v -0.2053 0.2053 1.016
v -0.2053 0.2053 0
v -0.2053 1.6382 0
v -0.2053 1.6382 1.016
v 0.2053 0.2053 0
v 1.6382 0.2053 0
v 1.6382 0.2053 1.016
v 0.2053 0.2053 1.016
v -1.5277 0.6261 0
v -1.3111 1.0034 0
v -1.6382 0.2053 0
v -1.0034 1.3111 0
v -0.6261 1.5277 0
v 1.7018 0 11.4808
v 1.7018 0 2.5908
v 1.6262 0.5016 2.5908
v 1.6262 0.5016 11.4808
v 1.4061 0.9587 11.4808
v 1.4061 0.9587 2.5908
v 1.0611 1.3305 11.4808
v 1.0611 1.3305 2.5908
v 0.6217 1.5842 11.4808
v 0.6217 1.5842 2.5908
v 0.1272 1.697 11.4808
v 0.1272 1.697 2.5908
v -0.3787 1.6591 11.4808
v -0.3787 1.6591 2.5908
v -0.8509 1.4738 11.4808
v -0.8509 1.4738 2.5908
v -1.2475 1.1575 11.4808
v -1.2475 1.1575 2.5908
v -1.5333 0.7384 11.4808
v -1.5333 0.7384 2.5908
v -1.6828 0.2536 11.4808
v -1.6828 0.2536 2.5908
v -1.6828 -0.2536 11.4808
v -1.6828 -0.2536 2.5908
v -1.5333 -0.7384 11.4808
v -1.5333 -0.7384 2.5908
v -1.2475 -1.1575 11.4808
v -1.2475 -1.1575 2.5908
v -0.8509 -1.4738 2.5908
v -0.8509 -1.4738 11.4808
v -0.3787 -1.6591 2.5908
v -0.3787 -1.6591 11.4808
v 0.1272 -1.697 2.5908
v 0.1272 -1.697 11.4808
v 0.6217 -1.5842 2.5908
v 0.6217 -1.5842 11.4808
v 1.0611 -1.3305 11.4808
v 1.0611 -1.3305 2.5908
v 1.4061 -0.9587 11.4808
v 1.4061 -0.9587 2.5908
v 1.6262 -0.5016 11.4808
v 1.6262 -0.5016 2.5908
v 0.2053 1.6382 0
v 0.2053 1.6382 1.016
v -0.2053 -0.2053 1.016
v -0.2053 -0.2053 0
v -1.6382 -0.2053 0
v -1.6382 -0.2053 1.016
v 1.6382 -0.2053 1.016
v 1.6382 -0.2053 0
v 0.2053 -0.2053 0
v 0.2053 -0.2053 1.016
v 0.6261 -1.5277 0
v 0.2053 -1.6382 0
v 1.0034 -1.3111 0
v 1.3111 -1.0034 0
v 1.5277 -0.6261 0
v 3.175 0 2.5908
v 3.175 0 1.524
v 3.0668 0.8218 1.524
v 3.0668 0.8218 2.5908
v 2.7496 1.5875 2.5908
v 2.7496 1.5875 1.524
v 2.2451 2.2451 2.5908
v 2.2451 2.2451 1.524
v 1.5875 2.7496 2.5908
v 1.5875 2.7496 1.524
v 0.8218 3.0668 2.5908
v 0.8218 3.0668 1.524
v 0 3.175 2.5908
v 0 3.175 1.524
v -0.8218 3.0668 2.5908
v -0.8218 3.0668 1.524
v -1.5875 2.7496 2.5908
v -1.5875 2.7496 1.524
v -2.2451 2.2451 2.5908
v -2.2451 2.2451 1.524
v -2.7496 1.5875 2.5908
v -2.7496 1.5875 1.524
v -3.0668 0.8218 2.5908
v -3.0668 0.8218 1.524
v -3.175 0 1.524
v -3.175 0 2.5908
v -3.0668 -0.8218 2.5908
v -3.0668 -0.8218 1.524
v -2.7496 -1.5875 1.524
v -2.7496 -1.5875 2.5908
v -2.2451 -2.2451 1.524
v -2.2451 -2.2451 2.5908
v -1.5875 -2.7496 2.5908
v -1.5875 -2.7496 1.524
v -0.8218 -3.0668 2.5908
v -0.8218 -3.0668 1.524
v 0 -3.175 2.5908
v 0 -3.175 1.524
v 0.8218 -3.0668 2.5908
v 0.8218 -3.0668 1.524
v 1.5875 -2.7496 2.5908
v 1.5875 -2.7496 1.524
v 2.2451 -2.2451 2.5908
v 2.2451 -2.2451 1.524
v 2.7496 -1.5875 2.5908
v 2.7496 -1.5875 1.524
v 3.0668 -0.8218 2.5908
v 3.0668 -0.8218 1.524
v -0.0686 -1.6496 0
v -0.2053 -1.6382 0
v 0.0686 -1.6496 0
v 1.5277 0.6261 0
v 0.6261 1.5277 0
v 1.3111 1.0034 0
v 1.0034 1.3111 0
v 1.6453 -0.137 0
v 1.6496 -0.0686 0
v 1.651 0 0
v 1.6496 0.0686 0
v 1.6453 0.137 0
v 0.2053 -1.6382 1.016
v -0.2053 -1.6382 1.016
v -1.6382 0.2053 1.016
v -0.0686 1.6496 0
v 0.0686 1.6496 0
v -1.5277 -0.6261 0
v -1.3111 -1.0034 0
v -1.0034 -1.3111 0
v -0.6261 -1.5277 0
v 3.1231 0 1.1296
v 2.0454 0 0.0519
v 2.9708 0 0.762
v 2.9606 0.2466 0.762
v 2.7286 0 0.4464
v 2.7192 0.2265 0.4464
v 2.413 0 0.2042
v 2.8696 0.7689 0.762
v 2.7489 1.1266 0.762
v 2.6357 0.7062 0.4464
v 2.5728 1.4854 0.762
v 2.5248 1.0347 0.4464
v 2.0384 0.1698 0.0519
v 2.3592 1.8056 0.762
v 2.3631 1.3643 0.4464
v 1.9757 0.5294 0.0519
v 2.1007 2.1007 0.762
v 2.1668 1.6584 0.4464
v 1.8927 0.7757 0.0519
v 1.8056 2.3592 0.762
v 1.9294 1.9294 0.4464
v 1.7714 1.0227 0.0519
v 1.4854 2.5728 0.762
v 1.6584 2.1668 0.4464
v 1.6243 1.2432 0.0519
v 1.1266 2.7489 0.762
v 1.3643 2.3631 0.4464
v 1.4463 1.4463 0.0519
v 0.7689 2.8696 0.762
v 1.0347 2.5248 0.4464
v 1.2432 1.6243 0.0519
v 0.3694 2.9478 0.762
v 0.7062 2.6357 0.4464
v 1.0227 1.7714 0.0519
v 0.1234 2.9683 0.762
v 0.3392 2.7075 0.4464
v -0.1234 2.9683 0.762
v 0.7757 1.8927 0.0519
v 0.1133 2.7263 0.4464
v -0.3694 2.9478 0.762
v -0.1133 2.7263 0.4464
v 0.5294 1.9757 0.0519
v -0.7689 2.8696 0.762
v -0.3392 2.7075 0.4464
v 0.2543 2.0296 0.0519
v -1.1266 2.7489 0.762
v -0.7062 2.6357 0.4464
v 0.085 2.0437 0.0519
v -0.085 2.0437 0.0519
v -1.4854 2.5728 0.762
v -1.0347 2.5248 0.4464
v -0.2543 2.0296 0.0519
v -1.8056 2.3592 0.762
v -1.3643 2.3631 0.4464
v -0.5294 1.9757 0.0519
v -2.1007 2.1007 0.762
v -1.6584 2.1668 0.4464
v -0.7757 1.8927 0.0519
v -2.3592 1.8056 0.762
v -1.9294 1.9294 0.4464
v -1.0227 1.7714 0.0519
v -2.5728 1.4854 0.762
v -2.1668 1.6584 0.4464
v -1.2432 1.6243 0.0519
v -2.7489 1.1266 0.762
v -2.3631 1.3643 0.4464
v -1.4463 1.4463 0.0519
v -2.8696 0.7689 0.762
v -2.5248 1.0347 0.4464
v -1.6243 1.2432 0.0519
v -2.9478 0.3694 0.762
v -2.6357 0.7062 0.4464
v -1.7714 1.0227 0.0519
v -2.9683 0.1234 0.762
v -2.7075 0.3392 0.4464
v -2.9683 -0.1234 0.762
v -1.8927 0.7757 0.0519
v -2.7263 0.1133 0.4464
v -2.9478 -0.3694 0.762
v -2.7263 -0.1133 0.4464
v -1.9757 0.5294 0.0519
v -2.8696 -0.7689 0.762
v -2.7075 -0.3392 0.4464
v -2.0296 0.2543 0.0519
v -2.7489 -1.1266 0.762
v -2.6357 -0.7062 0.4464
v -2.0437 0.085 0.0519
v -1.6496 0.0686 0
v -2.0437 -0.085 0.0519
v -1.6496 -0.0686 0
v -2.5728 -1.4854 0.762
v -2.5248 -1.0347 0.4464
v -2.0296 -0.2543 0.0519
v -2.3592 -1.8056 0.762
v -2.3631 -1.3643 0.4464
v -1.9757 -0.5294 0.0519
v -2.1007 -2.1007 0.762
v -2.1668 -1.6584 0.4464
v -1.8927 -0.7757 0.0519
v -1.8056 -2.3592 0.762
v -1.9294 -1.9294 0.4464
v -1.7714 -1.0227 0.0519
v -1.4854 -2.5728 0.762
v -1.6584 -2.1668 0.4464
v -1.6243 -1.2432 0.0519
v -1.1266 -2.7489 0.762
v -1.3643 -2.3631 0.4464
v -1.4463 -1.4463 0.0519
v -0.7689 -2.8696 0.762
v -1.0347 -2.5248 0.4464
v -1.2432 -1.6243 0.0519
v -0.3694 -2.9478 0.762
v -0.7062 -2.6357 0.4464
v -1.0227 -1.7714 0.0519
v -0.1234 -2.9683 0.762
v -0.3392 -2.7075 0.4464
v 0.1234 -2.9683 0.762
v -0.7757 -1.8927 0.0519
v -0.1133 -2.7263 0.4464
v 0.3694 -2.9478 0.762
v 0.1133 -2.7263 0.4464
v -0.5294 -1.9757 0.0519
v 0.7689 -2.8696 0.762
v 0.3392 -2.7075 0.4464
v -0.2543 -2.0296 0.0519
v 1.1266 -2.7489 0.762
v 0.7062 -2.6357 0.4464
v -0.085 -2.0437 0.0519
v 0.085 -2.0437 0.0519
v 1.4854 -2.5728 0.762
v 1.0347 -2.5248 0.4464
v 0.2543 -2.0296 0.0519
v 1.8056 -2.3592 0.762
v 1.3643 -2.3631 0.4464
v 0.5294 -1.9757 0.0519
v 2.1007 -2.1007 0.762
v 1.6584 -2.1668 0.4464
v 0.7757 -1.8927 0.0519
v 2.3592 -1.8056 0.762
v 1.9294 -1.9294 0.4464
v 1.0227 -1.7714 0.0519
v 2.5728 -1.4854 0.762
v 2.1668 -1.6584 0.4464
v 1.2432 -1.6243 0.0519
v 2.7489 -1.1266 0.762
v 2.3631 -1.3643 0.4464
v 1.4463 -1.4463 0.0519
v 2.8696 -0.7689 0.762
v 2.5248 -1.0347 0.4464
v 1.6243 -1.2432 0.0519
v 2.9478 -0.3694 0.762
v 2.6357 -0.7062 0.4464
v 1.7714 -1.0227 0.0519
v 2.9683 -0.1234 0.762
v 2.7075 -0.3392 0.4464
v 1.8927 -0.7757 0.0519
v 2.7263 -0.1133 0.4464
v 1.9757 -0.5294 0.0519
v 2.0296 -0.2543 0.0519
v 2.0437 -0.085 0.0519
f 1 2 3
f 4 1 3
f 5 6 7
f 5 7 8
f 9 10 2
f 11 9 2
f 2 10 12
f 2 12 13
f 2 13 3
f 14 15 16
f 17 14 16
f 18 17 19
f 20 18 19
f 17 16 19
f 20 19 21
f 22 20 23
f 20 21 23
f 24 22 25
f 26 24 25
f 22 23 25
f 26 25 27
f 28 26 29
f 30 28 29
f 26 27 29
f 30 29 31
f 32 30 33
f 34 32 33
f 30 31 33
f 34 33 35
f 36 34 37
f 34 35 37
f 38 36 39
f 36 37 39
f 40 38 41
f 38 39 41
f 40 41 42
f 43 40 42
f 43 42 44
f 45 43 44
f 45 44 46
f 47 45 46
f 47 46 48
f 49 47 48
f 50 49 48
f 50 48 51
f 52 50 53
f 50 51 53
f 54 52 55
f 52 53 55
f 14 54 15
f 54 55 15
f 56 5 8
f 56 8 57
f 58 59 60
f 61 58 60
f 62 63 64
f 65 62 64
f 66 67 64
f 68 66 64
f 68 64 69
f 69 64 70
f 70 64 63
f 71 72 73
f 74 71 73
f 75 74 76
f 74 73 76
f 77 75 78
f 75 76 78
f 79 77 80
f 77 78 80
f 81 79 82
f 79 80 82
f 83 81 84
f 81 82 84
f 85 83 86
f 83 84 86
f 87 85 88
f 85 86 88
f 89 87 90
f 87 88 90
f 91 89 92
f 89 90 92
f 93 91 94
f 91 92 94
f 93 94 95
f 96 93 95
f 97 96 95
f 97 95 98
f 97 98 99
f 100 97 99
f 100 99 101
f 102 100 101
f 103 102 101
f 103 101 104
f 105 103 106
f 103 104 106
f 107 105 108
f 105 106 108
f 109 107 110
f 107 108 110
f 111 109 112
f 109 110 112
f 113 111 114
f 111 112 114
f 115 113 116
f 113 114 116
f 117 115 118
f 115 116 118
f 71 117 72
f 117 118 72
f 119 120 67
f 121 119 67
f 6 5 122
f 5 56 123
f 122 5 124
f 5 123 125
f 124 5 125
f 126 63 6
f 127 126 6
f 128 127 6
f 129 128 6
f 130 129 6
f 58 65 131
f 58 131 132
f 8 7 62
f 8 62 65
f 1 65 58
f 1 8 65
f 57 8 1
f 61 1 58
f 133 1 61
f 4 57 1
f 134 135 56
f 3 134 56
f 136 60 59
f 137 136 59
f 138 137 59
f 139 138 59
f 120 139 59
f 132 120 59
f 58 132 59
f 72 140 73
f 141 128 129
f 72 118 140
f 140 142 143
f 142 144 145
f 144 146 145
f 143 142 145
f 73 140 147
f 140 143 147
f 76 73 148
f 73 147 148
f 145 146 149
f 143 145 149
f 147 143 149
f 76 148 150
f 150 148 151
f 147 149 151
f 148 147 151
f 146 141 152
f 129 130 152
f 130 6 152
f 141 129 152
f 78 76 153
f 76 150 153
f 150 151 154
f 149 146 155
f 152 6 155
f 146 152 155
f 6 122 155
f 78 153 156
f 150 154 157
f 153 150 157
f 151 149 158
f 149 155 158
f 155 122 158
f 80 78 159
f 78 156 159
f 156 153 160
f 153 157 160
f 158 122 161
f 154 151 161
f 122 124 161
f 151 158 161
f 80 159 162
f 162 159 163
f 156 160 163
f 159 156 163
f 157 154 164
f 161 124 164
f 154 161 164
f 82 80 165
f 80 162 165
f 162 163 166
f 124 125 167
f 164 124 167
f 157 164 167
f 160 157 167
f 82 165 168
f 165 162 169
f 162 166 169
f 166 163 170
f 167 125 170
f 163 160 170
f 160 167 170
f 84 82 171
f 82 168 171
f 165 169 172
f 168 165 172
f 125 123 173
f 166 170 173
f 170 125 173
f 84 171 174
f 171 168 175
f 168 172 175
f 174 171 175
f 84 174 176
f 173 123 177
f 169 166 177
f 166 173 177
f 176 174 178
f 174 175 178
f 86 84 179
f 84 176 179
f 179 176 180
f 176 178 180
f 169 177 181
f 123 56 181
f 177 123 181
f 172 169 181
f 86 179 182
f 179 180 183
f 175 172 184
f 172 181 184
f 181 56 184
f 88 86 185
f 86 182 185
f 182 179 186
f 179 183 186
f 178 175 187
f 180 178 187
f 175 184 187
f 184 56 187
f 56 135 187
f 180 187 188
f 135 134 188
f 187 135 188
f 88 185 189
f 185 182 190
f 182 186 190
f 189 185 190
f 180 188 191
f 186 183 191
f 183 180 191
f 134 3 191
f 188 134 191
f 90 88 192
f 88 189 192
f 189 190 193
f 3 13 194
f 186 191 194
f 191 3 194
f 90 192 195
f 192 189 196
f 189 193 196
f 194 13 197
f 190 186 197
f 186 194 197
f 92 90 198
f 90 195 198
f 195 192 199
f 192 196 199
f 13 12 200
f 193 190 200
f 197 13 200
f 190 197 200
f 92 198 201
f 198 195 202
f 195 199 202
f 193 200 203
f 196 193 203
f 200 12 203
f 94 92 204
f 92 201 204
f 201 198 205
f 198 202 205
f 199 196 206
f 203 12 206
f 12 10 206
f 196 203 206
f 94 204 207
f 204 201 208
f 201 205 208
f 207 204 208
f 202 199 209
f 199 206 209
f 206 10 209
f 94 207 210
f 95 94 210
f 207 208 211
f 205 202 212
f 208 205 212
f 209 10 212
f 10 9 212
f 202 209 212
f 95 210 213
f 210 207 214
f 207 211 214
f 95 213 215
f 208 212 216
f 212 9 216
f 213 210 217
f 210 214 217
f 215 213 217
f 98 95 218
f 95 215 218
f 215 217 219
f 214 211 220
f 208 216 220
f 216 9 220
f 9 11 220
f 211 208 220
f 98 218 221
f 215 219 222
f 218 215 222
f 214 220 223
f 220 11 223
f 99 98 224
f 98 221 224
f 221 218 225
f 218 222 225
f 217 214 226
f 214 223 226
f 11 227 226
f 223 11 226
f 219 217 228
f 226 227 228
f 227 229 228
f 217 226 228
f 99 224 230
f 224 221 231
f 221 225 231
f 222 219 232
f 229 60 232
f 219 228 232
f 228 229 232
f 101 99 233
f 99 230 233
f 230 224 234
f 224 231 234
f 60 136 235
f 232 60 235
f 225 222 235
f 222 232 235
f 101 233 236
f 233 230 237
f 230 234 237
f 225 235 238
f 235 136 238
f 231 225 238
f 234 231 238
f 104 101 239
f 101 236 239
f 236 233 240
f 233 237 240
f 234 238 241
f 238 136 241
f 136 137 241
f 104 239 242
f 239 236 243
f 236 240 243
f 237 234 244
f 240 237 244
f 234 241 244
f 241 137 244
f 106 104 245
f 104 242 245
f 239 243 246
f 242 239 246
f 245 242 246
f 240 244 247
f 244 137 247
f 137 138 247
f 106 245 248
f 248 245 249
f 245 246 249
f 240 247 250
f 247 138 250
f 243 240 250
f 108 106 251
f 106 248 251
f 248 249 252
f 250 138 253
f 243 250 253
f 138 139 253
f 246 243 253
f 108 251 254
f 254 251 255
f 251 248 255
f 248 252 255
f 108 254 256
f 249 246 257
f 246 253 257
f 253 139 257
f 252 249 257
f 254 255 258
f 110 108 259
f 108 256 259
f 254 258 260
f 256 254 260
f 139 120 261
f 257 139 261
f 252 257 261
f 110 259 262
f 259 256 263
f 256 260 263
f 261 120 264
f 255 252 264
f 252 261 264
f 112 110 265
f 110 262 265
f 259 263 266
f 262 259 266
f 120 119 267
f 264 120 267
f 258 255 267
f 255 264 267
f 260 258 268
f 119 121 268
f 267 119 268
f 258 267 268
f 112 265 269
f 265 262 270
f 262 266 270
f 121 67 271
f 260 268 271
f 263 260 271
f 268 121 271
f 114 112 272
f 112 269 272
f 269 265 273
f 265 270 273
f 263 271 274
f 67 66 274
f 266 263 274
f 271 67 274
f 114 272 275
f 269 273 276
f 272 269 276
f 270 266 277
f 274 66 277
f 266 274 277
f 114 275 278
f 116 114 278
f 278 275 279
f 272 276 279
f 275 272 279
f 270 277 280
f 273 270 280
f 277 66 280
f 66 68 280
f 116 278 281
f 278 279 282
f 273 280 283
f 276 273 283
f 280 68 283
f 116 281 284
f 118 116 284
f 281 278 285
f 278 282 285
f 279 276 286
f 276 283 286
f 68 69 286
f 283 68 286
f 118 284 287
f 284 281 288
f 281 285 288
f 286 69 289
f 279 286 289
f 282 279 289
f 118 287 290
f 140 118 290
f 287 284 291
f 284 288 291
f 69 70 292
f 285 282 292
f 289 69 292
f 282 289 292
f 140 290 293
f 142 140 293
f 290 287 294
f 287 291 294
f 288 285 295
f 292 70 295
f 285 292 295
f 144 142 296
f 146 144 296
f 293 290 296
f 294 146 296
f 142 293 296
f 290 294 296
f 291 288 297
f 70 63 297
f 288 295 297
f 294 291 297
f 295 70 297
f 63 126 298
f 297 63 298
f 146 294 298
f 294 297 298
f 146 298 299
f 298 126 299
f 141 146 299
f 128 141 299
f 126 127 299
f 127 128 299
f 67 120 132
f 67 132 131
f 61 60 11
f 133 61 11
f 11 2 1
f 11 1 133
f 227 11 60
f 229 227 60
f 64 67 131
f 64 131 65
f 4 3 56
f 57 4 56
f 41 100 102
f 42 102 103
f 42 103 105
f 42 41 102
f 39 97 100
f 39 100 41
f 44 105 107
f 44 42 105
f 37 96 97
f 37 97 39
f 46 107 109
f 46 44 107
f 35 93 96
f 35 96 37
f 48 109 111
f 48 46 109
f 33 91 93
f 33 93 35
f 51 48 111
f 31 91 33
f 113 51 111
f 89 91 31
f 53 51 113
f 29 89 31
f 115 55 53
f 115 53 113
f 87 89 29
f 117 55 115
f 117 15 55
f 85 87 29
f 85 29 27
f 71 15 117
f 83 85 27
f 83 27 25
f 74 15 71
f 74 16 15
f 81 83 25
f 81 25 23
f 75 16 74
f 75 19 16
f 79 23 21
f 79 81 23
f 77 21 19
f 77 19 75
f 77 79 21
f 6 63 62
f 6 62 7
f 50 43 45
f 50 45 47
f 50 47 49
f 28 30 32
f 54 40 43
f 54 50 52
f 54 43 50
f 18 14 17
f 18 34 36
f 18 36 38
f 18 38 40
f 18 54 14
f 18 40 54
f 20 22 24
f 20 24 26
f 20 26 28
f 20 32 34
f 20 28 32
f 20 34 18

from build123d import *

# Parameters (mm, degrees)
SKETCH1_R         = 3.175
EXTRUDE1_DEPTH    = 2.5908
FILLET1_R         = 1.524
SKETCH2_R         = 1.7018
EXTRUDE2_DEPTH    = 8.89
SKETCH3_W         = 3.27637992
SKETCH3_H         = 0.410534548
EXTRUDE3_DEPTH    = 1.016
CIRPATTERN1_COUNT = 2
CIRPATTERN1_ANGLE = 90


with BuildPart() as part:
    # Sketch1 → Extrude1 (new body)
    with BuildSketch(Plane.XY):
        Circle(SKETCH1_R)
    extrude(amount=EXTRUDE1_DEPTH)

    # Fillet1
    fillet1_edges = [part.edges().sort_by_distance(p)[0] for p in [
        (-3.175, 0, 0),
    ]]
    fillet(fillet1_edges, radius=FILLET1_R)

    # Sketch2 → Extrude2 (add)
    with BuildSketch(Plane.XY.offset(2.5908)):
        Circle(SKETCH2_R)
    extrude(amount=EXTRUDE2_DEPTH)

    # Sketch3 → Extrude3 (cut)
    with BuildSketch(Plane(origin=(0, 0, 0), x_dir=(-1, 0, 0), z_dir=(0, 0, -1))):
        Rectangle(SKETCH3_W, SKETCH3_H)
    extrude3 = extrude(amount=-EXTRUDE3_DEPTH, mode=Mode.SUBTRACT)

    # CirPattern1: Extrude3 ×2 about axis
    cirpattern1_axis = Axis((0, 0, 0), (0, 0, -1))
    for i in range(1, CIRPATTERN1_COUNT):
        add(extrude3.rotate(cirpattern1_axis, i * CIRPATTERN1_ANGLE / (CIRPATTERN1_COUNT - 1)), mode=Mode.SUBTRACT)


solid = part.part
